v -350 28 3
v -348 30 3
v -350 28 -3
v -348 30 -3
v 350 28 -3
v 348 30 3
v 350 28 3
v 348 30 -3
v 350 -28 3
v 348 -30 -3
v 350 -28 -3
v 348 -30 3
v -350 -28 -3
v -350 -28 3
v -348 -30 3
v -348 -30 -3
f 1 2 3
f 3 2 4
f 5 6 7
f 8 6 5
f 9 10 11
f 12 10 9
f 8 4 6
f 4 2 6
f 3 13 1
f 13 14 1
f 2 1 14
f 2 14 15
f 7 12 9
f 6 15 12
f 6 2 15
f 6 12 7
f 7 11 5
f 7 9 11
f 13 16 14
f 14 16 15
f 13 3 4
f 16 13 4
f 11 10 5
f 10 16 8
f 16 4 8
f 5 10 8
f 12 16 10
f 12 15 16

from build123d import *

# Parameters (mm, degrees)
SKETCH_1_W      = 700
SKETCH_1_H      = 60
EXTRUDE_1_DEPTH = 3
CHAMFER_1_SIZE  = 2


with BuildPart() as part:
    # 草图1 → 凸台-拉伸1 (new body, symmetric)
    with BuildSketch(Plane.XY):
        Rectangle(SKETCH_1_W, SKETCH_1_H)
    extrude(amount=EXTRUDE_1_DEPTH, both=True)

    # 倒角1
    chamfer_1_edges = [part.edges().sort_by_distance(p)[0] for p in [
        (-350, 30, 0),
        (350, 30, 0),
        (350, -30, 0),
        (-350, -30, 0),
    ]]
    chamfer(chamfer_1_edges, length=CHAMFER_1_SIZE)


solid = part.part
